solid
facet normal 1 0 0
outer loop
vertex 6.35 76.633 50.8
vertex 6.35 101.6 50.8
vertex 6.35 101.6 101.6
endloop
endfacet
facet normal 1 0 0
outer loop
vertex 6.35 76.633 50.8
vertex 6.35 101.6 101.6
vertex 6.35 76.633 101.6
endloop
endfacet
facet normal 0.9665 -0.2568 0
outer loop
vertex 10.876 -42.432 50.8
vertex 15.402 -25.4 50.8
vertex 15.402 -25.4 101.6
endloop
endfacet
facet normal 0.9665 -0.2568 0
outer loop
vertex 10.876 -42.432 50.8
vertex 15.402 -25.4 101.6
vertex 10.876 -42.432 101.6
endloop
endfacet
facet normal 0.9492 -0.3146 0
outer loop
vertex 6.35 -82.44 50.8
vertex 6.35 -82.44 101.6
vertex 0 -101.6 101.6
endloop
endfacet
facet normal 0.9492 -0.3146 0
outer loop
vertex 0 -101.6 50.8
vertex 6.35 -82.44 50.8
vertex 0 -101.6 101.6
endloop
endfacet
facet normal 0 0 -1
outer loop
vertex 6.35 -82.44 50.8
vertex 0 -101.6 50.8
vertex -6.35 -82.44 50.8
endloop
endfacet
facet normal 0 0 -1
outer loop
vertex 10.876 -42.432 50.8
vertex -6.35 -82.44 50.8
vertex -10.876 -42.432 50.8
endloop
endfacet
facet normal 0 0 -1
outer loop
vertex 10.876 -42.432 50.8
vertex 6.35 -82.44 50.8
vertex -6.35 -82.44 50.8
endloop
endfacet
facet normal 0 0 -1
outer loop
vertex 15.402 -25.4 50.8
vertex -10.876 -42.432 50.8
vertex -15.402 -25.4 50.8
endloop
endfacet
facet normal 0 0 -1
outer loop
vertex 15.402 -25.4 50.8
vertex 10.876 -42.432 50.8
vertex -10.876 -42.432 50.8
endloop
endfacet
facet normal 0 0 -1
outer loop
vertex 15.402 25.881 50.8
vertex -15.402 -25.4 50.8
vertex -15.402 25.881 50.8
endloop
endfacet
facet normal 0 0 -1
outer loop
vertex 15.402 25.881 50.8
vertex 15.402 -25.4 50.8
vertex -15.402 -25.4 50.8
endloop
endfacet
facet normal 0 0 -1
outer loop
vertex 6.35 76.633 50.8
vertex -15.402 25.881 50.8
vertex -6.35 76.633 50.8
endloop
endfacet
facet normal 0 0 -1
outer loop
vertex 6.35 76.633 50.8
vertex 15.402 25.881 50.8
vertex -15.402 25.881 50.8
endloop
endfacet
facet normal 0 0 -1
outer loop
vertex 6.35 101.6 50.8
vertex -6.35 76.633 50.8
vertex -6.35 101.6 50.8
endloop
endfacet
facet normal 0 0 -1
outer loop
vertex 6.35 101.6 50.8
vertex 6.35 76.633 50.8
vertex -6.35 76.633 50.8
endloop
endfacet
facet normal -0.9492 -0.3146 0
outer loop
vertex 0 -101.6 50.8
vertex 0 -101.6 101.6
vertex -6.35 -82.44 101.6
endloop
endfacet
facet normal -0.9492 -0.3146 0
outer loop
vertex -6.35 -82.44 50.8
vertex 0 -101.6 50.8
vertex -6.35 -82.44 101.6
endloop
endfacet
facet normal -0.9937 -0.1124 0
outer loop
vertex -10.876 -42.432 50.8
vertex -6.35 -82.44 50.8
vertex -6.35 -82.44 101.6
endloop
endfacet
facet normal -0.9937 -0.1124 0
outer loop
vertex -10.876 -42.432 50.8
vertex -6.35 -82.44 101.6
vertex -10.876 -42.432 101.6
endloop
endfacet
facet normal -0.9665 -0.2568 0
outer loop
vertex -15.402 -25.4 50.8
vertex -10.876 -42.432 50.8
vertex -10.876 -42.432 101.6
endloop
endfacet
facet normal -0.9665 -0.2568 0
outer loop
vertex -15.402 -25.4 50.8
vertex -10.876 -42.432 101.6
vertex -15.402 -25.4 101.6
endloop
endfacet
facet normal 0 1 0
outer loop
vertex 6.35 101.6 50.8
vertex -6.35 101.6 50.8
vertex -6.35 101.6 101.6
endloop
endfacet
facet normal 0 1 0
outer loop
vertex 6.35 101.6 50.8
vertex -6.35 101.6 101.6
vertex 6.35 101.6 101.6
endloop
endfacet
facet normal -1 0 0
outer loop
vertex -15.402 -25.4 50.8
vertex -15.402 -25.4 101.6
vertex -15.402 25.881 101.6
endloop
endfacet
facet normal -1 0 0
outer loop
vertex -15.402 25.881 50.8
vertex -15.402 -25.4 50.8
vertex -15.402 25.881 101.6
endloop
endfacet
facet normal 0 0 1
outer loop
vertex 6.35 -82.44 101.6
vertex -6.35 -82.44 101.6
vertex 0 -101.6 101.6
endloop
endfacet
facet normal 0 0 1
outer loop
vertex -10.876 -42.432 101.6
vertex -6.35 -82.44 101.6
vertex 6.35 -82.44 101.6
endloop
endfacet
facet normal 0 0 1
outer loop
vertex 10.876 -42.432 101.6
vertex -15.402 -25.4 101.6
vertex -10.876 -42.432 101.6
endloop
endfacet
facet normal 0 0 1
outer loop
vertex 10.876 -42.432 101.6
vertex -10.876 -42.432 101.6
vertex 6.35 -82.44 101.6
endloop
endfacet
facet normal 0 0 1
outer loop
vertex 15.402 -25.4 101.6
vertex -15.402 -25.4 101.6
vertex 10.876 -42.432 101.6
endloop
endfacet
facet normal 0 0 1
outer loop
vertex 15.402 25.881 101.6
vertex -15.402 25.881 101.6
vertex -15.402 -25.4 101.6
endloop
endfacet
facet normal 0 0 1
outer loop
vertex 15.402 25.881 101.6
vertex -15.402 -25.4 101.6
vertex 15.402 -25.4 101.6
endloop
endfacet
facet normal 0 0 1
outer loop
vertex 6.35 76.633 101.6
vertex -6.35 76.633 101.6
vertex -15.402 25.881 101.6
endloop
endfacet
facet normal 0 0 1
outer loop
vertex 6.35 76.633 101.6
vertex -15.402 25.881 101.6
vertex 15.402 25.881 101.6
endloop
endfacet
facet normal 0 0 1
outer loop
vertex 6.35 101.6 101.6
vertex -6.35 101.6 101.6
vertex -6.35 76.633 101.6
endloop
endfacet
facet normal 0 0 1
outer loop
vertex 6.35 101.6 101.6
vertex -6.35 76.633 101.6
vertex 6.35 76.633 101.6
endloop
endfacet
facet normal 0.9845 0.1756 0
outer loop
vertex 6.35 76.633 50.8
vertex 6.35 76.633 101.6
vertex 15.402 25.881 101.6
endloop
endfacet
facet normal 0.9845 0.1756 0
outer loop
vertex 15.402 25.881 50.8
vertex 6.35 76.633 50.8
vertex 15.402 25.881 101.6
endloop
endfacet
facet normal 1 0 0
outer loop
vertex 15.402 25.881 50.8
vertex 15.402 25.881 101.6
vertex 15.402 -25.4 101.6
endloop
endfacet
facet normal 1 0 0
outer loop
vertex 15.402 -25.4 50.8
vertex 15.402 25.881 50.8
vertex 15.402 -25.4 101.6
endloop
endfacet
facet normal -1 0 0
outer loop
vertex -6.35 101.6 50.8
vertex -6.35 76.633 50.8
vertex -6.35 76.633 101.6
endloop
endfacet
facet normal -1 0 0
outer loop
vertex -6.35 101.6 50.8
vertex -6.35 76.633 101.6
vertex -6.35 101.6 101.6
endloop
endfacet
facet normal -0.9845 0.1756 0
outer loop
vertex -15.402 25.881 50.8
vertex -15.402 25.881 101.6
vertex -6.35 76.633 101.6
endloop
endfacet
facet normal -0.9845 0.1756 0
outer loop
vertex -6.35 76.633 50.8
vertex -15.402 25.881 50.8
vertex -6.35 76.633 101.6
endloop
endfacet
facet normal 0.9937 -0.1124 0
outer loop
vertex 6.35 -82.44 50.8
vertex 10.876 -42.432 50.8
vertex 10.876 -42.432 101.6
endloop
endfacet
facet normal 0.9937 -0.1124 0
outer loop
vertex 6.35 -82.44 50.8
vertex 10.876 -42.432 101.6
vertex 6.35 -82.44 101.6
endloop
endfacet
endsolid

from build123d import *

# Parameters (mm, degrees)
F0_W     = 127
F0_H     = 203.2
F1_DEPTH = 101.6
F3_DEPTH = 50.8
F4_DEPTH = 127.001


with BuildPart() as f1:
    # F0 (on Top) → F1 (new body)
    with BuildSketch(Plane.XY):
        Rectangle(F0_W, F0_H)
    extrude(amount=F1_DEPTH)

    # F2 (on face) → F3 (cut)
    with BuildSketch(Plane.XY.offset(101.6)):
        Polygon((-6.35, -82.4402868748), (-10.8761594549, -42.4315269709), (-15.4023189098, -25.4), (-15.4023189098, 25.8809477091), (-6.35, 76.6328498721), (-6.35, 101.6), (-63.5, 101.6), (-63.5, -101.6), (0, -101.6), align=None)
        Polygon((15.4023189098, -25.4), (10.8761594549, -42.4315269709), (6.35, -82.4402868748), (0, -101.6), (63.5, -101.6), (63.5, 101.6), (6.35, 101.6), (6.35, 76.6328498721), (15.4023189098, 25.8809477091), align=None)
    extrude(amount=-F3_DEPTH, mode=Mode.SUBTRACT)

    # F4 (cut, through all): a face of the model
    f4_faces = [f1.faces().sort_by_distance(p)[0] for p in [
        (63.5, 0, 25.4),
    ]]
    extrude(f4_faces, amount=-F4_DEPTH, mode=Mode.SUBTRACT)


solid = f1.part
